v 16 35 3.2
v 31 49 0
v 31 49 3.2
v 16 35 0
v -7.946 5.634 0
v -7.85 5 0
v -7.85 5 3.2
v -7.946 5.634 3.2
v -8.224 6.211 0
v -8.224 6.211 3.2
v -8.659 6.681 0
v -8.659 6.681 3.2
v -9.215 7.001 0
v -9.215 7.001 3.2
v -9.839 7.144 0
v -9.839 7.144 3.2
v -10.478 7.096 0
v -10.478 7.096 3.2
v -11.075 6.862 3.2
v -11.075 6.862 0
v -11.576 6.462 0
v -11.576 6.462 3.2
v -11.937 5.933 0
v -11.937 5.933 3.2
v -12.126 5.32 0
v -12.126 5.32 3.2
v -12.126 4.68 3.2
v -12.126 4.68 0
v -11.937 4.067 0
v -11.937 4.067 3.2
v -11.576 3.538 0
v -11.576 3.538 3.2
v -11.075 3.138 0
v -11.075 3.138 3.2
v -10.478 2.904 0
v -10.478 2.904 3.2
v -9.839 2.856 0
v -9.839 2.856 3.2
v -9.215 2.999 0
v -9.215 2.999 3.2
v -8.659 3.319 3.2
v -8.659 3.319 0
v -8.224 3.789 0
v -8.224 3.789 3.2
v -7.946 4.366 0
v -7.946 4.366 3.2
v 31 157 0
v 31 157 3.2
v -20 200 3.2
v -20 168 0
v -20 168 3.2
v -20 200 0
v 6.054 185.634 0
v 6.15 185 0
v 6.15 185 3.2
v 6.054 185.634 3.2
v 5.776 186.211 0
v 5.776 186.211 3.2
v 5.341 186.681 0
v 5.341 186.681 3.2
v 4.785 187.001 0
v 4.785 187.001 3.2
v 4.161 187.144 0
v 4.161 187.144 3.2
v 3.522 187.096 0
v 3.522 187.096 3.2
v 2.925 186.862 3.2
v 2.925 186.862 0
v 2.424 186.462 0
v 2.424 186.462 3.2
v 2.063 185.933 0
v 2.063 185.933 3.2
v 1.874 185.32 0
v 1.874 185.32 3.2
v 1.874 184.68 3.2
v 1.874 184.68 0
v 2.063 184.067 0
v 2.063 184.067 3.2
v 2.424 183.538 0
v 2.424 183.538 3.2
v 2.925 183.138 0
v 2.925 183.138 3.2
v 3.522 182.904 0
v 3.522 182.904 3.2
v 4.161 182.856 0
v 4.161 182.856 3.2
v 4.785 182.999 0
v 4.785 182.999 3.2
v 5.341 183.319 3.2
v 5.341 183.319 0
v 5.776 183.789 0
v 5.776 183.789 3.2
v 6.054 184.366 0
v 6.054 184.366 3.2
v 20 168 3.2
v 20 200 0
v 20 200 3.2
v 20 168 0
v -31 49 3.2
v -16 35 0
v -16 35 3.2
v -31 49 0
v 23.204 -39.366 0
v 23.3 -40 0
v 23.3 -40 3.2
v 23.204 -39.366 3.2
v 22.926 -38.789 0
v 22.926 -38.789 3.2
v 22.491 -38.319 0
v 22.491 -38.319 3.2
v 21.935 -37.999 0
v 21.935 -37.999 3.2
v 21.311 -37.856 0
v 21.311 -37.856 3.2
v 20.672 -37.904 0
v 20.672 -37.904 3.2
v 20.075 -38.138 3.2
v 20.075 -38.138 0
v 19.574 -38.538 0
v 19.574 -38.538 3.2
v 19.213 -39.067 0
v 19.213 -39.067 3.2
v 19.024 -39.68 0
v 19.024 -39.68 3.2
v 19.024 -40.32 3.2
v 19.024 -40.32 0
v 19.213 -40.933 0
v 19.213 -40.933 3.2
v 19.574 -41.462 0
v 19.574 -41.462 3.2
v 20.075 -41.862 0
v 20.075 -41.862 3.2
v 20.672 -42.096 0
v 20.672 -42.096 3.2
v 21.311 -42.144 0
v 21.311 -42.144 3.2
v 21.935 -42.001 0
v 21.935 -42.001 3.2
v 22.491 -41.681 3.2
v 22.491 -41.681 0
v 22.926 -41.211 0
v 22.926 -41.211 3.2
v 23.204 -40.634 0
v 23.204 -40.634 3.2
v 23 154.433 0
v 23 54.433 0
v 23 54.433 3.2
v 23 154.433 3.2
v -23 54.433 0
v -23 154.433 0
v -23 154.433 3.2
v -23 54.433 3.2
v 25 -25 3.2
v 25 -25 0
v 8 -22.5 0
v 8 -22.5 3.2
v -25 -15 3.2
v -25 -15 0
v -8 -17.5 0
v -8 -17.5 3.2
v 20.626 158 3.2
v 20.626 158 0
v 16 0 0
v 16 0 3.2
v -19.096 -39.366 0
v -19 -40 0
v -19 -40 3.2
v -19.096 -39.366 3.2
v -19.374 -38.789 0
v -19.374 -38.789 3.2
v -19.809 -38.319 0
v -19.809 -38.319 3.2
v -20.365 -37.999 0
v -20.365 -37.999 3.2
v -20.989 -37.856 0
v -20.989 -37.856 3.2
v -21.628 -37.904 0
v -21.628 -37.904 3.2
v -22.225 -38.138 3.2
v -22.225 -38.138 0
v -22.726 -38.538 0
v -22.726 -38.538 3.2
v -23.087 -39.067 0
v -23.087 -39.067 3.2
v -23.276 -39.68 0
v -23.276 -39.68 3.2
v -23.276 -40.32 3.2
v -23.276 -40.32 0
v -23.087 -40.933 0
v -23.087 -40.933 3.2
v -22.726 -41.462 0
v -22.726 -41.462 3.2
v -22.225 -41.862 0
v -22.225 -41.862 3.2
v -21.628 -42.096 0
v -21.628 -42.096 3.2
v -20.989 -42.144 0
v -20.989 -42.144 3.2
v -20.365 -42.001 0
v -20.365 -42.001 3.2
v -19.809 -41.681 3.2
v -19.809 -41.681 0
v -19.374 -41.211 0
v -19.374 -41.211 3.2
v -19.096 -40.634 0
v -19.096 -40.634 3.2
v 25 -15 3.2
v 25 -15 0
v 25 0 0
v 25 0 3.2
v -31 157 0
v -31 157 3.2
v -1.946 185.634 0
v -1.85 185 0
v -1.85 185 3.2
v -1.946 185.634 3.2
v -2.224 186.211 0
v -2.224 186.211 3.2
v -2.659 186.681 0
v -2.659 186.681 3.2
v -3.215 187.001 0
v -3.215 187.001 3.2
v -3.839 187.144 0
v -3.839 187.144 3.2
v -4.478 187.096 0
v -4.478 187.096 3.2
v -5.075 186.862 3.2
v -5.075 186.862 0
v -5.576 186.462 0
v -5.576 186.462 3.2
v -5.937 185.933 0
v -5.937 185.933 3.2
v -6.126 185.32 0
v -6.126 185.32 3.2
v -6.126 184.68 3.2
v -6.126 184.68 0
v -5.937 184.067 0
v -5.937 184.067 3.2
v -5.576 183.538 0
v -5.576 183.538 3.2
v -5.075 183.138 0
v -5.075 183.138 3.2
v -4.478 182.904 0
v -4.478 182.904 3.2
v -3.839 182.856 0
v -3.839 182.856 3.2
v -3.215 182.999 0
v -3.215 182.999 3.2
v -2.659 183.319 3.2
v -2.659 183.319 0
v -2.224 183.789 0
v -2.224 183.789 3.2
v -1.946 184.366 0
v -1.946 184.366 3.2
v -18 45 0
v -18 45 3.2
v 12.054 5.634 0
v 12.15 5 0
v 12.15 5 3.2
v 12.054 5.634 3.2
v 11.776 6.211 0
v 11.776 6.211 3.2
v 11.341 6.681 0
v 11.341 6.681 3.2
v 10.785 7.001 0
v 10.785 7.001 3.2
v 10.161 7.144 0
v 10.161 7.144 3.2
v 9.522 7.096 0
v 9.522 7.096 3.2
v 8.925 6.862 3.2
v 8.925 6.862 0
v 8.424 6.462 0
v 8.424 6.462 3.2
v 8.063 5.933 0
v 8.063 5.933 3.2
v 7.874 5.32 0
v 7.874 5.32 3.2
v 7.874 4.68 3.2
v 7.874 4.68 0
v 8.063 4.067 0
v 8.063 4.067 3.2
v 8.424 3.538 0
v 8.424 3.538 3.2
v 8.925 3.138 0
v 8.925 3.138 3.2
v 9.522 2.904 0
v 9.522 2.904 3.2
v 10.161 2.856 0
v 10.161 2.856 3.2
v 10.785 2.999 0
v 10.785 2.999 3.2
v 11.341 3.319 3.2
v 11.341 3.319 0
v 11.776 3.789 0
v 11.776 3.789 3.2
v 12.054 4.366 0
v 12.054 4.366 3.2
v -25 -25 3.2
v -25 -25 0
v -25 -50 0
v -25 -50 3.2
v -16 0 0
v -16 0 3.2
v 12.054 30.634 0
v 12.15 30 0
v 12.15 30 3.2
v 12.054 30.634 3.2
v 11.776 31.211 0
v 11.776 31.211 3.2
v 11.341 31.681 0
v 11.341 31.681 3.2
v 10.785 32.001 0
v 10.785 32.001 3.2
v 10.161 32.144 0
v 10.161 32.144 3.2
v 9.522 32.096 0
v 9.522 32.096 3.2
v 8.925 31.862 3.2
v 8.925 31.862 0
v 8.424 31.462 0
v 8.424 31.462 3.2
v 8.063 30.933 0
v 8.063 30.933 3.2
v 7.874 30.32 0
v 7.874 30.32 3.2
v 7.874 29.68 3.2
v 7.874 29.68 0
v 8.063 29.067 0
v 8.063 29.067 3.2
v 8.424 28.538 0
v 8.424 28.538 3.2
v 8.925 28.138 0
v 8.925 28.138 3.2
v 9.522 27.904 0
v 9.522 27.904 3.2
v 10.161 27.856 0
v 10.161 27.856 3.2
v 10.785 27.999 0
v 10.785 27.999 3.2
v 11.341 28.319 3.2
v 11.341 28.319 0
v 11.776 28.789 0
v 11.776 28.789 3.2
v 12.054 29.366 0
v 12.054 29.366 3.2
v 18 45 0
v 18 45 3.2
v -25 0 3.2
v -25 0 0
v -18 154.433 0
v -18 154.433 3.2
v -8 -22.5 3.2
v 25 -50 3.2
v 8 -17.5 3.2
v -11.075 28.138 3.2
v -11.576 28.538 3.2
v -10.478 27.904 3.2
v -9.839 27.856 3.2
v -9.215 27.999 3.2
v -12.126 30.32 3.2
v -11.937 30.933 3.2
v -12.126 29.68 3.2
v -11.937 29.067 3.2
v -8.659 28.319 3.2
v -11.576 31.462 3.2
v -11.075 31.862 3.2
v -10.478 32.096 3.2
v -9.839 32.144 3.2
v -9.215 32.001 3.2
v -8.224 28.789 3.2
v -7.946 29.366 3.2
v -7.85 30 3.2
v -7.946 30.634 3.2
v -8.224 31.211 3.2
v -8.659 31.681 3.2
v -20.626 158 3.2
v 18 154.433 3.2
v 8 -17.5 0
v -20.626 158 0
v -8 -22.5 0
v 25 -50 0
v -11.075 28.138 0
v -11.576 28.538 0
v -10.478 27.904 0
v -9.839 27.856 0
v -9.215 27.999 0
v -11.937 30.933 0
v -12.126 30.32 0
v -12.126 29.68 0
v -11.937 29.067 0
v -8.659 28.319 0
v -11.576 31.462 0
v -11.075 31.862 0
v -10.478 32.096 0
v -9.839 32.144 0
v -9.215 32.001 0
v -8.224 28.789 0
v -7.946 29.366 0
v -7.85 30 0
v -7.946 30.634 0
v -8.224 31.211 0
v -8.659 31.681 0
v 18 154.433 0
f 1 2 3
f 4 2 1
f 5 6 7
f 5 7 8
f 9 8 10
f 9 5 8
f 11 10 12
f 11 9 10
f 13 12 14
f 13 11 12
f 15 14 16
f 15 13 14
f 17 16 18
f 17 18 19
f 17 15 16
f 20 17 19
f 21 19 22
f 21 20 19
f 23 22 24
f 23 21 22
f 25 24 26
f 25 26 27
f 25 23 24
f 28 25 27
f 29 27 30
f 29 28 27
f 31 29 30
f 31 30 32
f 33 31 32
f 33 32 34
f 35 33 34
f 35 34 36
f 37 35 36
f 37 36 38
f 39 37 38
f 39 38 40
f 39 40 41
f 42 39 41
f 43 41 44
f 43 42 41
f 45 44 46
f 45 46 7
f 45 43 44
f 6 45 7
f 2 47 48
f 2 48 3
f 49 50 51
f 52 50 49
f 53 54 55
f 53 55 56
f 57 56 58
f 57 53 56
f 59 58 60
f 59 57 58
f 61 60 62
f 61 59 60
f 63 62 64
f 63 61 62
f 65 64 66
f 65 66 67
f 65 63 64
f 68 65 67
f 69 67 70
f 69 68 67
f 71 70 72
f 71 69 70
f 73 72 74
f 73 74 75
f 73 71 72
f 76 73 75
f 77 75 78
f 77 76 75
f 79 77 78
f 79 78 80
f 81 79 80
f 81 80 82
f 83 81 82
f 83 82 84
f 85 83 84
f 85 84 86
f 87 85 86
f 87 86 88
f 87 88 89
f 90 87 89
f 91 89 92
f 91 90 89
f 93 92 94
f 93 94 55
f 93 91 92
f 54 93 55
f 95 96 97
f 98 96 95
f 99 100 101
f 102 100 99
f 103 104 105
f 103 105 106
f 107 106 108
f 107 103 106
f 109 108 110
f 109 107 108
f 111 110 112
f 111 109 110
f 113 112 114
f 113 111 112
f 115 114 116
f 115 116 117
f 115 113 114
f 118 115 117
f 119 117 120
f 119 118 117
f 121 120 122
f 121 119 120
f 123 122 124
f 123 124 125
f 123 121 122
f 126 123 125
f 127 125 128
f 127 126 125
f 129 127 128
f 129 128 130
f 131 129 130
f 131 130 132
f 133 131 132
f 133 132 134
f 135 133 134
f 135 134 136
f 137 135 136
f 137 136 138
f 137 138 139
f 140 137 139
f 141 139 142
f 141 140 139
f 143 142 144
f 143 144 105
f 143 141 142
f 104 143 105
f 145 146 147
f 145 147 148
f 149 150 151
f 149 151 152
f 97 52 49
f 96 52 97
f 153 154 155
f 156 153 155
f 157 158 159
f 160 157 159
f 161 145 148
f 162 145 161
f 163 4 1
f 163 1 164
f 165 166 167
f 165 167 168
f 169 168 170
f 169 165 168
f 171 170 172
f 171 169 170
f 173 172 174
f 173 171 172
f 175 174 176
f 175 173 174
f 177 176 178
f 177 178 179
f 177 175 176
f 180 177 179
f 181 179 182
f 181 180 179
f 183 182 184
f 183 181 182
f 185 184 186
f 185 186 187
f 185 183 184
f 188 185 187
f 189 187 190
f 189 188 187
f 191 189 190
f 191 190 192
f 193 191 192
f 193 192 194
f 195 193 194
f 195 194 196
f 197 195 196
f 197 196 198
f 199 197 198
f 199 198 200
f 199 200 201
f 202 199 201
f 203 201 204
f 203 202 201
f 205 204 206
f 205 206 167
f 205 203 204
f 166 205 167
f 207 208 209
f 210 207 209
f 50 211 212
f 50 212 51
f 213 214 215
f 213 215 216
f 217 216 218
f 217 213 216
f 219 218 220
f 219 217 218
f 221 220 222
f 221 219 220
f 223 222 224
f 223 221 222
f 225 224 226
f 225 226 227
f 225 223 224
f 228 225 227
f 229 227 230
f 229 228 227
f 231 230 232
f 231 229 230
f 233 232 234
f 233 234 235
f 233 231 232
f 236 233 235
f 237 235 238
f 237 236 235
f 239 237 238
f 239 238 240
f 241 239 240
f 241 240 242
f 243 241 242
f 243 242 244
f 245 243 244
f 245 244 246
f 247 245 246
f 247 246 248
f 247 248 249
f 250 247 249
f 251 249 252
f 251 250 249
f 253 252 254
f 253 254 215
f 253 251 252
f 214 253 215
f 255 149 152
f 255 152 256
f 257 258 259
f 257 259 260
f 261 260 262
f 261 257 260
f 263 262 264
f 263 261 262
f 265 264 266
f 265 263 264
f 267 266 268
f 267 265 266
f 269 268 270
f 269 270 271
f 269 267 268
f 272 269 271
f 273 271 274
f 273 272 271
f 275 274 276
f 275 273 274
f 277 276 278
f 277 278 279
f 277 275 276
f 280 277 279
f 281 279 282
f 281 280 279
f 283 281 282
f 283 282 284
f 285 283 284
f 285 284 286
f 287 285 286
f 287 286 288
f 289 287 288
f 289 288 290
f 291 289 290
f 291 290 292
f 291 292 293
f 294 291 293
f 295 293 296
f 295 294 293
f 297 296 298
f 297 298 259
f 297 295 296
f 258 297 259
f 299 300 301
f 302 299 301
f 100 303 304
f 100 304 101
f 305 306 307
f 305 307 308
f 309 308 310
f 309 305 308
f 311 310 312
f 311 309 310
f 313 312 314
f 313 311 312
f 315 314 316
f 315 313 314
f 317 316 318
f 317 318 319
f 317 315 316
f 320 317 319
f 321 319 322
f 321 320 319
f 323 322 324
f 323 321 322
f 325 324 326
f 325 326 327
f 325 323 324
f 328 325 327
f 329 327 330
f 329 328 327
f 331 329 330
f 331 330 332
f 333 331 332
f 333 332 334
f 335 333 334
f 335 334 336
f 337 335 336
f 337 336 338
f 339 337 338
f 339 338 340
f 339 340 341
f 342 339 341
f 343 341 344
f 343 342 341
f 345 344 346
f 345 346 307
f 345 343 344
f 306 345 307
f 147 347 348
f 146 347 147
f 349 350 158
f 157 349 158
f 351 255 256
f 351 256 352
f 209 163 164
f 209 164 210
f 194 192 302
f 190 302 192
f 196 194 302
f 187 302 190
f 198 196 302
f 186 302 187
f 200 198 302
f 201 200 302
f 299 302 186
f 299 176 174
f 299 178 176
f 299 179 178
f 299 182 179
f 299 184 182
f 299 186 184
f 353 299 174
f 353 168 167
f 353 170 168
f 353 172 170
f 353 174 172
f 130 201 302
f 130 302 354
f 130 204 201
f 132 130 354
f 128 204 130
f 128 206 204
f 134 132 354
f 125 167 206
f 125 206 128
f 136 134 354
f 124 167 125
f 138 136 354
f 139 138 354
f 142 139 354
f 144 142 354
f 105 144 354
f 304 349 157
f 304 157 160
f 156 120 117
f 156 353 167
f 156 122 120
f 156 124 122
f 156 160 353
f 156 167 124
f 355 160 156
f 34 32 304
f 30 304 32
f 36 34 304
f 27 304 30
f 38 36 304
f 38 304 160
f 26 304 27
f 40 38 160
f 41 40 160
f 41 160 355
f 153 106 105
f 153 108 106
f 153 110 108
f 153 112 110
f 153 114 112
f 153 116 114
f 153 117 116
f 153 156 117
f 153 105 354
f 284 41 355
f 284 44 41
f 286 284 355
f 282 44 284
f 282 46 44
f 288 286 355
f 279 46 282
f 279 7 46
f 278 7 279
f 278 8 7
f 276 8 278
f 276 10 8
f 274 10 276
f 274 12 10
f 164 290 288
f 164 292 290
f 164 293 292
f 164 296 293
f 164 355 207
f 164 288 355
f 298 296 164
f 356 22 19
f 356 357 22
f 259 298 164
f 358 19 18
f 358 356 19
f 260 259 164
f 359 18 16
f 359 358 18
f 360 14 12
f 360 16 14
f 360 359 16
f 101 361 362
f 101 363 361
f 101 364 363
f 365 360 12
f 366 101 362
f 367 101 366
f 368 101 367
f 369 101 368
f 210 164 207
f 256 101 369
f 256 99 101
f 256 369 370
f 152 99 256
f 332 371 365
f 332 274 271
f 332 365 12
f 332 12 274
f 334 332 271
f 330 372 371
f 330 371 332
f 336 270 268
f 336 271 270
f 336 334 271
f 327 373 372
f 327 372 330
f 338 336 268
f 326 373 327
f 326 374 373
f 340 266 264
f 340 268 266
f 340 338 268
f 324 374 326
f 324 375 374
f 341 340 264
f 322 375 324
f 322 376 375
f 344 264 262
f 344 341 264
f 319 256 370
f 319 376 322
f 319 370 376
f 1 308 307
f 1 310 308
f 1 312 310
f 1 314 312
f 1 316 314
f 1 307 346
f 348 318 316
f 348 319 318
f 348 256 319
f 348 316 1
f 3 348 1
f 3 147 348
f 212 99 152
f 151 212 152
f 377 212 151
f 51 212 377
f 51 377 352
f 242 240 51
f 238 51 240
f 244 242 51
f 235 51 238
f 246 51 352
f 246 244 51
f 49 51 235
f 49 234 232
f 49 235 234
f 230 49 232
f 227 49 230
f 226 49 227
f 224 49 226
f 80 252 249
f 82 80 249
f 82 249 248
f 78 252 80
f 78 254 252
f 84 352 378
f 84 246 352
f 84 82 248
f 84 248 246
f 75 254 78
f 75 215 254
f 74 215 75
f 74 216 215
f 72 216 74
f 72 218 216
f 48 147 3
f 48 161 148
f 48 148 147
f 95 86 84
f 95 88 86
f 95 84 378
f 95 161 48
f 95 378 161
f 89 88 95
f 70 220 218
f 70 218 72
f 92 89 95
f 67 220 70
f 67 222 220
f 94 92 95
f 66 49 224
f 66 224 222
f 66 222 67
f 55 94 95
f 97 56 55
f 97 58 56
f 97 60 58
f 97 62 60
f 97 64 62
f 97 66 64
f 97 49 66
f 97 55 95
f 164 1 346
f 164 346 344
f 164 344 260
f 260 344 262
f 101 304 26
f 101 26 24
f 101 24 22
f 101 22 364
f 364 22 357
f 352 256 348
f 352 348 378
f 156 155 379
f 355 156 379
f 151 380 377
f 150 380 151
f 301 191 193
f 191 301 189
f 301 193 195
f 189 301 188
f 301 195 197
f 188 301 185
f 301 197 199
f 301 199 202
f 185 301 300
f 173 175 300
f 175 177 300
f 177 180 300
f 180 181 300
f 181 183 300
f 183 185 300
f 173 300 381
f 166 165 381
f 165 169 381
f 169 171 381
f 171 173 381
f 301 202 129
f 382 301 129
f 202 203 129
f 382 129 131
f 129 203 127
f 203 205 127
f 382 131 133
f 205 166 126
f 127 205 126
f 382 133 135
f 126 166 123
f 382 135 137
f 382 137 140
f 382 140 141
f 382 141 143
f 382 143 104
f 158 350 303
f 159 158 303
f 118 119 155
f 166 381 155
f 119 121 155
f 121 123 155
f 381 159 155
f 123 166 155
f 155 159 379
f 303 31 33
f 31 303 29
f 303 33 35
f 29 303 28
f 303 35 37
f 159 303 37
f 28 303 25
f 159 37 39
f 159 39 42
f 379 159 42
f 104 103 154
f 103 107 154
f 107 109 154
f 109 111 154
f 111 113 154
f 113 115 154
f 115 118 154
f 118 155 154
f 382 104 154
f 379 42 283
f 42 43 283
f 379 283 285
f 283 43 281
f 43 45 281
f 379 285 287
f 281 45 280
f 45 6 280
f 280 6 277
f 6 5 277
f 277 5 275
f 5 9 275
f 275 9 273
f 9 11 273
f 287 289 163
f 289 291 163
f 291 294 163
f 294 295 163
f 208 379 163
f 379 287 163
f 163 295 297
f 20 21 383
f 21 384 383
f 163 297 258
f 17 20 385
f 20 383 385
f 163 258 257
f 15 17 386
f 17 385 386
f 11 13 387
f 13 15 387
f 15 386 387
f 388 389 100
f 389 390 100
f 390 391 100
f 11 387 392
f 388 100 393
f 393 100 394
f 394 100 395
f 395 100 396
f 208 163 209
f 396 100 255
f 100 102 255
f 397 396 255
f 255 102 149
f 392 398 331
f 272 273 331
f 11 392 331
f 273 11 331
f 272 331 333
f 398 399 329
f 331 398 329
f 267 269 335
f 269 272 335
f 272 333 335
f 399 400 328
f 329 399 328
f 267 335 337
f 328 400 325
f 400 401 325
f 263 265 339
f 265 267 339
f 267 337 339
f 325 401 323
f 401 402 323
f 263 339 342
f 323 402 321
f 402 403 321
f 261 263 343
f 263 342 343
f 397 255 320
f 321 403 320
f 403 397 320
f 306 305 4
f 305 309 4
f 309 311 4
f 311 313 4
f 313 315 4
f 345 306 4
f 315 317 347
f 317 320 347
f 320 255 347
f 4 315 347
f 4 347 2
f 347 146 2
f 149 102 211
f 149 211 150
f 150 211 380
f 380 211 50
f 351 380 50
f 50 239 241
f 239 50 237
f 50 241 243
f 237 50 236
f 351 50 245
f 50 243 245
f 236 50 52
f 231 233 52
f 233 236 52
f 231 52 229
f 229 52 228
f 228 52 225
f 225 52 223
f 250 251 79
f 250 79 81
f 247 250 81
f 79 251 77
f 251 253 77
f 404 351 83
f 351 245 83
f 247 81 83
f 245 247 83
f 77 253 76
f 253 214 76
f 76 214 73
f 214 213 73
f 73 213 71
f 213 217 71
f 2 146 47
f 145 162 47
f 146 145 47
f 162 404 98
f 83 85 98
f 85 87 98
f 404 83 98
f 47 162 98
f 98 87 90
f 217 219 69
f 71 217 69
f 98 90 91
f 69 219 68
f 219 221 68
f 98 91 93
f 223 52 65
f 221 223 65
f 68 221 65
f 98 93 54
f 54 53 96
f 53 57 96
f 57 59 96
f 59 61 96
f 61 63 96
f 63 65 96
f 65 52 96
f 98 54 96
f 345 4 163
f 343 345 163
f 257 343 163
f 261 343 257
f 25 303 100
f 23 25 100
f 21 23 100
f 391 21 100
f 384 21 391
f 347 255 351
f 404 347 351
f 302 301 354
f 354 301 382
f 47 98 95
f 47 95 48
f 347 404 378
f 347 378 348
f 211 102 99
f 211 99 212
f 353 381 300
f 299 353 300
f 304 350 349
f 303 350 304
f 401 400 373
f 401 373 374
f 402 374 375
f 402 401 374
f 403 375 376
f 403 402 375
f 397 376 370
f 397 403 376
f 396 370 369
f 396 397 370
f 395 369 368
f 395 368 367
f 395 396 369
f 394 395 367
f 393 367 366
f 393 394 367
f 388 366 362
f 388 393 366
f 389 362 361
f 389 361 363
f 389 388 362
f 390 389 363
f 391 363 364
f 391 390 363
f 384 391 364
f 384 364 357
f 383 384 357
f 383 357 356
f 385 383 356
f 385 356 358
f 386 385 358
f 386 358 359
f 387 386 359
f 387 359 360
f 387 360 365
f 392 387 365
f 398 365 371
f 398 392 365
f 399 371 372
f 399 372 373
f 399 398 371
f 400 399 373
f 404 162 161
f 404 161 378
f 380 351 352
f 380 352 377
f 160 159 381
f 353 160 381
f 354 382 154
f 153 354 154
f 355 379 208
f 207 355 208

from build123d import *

# Parameters (mm, degrees)
F0_R     = 2.15
F1_DEPTH = 3.2
F3_DEPTH = 74
F4_DEPTH = 32.4


with BuildPart() as f1:
    # F0 (on Top) → F1 (new body)
    with BuildSketch(Plane.XY):
        Polygon((-25, -25), (-25, -50), (25, -50), (25, -25), (8, -22.5), (8, -17.5), (25, -15), (25, 0), (-25, 0), (-25, -15), (-8, -17.5), (-8, -22.5), align=None)
        with Locations((-21.15, -40)):
            Circle(F0_R, mode=Mode.SUBTRACT)
        with Locations((21.15, -40)):
            Circle(F0_R, mode=Mode.SUBTRACT)
        Polygon((-35, 0), (-25, 0), (25, 0), (35, 0), (35, 225), (-35, 225), align=None)
        with Locations((-10, 5)):
            Circle(F0_R, mode=Mode.SUBTRACT)
        with Locations((-10, 30)):
            Circle(F0_R, mode=Mode.SUBTRACT)
        with Locations((10, 5)):
            Circle(F0_R, mode=Mode.SUBTRACT)
        with Locations((10, 30)):
            Circle(F0_R, mode=Mode.SUBTRACT)
        with Locations((-4, 185)):
            Circle(F0_R, mode=Mode.SUBTRACT)
        with Locations((4, 185)):
            Circle(F0_R, mode=Mode.SUBTRACT)
    extrude(amount=F1_DEPTH)

    # F2 (on Top) → F3 (cut)
    with BuildSketch(Plane.XY):
        Polygon((-20, 168), (-20, 200), (20, 200), (20, 168), (31, 157), (31, 225), (-31, 225), (-31, 157), align=None)
        Polygon((-31, 49), (-31, 157), (-31, 225), (-35, 225), (-35, 0), (-31, 0), align=None)
        Polygon((31, 225), (31, 157), (31, 49), (31, 0), (35, 0), (35, 225), align=None)
        Polygon((-16, 35), (-31, 49), (-31, 0), (-16, 0), align=None)
        Polygon((31, 0), (31, 49), (16, 35), (16, 0), align=None)
        Polygon((23, 154.432595), (20.625565, 158), (18, 154.432595), (18, 45), (23, 54.432595), align=None)
        Polygon((-18, 154.432595), (-20.625565, 158), (-23, 154.432595), (-23, 54.432595), (-18, 45), align=None)
    extrude(amount=F3_DEPTH, mode=Mode.SUBTRACT)

    # F2 (on Top) → F4 (cut)
    with BuildSketch(Plane.XY):
        Polygon((-20, 168), (-20, 200), (20, 200), (20, 168), (31, 157), (31, 225), (-31, 225), (-31, 157), align=None)
        Polygon((-31, 49), (-31, 157), (-31, 225), (-35, 225), (-35, 0), (-31, 0), align=None)
        Polygon((31, 225), (31, 157), (31, 49), (31, 0), (35, 0), (35, 225), align=None)
        Polygon((-16, 35), (-31, 49), (-31, 0), (-16, 0), align=None)
        Polygon((31, 0), (31, 49), (16, 35), (16, 0), align=None)
        Polygon((23, 154.432595), (20.625565, 158), (18, 154.432595), (18, 45), (23, 54.432595), align=None)
        Polygon((-18, 154.432595), (-20.625565, 158), (-23, 154.432595), (-23, 54.432595), (-18, 45), align=None)
    extrude(amount=-F4_DEPTH, mode=Mode.SUBTRACT)


solid = f1.part
